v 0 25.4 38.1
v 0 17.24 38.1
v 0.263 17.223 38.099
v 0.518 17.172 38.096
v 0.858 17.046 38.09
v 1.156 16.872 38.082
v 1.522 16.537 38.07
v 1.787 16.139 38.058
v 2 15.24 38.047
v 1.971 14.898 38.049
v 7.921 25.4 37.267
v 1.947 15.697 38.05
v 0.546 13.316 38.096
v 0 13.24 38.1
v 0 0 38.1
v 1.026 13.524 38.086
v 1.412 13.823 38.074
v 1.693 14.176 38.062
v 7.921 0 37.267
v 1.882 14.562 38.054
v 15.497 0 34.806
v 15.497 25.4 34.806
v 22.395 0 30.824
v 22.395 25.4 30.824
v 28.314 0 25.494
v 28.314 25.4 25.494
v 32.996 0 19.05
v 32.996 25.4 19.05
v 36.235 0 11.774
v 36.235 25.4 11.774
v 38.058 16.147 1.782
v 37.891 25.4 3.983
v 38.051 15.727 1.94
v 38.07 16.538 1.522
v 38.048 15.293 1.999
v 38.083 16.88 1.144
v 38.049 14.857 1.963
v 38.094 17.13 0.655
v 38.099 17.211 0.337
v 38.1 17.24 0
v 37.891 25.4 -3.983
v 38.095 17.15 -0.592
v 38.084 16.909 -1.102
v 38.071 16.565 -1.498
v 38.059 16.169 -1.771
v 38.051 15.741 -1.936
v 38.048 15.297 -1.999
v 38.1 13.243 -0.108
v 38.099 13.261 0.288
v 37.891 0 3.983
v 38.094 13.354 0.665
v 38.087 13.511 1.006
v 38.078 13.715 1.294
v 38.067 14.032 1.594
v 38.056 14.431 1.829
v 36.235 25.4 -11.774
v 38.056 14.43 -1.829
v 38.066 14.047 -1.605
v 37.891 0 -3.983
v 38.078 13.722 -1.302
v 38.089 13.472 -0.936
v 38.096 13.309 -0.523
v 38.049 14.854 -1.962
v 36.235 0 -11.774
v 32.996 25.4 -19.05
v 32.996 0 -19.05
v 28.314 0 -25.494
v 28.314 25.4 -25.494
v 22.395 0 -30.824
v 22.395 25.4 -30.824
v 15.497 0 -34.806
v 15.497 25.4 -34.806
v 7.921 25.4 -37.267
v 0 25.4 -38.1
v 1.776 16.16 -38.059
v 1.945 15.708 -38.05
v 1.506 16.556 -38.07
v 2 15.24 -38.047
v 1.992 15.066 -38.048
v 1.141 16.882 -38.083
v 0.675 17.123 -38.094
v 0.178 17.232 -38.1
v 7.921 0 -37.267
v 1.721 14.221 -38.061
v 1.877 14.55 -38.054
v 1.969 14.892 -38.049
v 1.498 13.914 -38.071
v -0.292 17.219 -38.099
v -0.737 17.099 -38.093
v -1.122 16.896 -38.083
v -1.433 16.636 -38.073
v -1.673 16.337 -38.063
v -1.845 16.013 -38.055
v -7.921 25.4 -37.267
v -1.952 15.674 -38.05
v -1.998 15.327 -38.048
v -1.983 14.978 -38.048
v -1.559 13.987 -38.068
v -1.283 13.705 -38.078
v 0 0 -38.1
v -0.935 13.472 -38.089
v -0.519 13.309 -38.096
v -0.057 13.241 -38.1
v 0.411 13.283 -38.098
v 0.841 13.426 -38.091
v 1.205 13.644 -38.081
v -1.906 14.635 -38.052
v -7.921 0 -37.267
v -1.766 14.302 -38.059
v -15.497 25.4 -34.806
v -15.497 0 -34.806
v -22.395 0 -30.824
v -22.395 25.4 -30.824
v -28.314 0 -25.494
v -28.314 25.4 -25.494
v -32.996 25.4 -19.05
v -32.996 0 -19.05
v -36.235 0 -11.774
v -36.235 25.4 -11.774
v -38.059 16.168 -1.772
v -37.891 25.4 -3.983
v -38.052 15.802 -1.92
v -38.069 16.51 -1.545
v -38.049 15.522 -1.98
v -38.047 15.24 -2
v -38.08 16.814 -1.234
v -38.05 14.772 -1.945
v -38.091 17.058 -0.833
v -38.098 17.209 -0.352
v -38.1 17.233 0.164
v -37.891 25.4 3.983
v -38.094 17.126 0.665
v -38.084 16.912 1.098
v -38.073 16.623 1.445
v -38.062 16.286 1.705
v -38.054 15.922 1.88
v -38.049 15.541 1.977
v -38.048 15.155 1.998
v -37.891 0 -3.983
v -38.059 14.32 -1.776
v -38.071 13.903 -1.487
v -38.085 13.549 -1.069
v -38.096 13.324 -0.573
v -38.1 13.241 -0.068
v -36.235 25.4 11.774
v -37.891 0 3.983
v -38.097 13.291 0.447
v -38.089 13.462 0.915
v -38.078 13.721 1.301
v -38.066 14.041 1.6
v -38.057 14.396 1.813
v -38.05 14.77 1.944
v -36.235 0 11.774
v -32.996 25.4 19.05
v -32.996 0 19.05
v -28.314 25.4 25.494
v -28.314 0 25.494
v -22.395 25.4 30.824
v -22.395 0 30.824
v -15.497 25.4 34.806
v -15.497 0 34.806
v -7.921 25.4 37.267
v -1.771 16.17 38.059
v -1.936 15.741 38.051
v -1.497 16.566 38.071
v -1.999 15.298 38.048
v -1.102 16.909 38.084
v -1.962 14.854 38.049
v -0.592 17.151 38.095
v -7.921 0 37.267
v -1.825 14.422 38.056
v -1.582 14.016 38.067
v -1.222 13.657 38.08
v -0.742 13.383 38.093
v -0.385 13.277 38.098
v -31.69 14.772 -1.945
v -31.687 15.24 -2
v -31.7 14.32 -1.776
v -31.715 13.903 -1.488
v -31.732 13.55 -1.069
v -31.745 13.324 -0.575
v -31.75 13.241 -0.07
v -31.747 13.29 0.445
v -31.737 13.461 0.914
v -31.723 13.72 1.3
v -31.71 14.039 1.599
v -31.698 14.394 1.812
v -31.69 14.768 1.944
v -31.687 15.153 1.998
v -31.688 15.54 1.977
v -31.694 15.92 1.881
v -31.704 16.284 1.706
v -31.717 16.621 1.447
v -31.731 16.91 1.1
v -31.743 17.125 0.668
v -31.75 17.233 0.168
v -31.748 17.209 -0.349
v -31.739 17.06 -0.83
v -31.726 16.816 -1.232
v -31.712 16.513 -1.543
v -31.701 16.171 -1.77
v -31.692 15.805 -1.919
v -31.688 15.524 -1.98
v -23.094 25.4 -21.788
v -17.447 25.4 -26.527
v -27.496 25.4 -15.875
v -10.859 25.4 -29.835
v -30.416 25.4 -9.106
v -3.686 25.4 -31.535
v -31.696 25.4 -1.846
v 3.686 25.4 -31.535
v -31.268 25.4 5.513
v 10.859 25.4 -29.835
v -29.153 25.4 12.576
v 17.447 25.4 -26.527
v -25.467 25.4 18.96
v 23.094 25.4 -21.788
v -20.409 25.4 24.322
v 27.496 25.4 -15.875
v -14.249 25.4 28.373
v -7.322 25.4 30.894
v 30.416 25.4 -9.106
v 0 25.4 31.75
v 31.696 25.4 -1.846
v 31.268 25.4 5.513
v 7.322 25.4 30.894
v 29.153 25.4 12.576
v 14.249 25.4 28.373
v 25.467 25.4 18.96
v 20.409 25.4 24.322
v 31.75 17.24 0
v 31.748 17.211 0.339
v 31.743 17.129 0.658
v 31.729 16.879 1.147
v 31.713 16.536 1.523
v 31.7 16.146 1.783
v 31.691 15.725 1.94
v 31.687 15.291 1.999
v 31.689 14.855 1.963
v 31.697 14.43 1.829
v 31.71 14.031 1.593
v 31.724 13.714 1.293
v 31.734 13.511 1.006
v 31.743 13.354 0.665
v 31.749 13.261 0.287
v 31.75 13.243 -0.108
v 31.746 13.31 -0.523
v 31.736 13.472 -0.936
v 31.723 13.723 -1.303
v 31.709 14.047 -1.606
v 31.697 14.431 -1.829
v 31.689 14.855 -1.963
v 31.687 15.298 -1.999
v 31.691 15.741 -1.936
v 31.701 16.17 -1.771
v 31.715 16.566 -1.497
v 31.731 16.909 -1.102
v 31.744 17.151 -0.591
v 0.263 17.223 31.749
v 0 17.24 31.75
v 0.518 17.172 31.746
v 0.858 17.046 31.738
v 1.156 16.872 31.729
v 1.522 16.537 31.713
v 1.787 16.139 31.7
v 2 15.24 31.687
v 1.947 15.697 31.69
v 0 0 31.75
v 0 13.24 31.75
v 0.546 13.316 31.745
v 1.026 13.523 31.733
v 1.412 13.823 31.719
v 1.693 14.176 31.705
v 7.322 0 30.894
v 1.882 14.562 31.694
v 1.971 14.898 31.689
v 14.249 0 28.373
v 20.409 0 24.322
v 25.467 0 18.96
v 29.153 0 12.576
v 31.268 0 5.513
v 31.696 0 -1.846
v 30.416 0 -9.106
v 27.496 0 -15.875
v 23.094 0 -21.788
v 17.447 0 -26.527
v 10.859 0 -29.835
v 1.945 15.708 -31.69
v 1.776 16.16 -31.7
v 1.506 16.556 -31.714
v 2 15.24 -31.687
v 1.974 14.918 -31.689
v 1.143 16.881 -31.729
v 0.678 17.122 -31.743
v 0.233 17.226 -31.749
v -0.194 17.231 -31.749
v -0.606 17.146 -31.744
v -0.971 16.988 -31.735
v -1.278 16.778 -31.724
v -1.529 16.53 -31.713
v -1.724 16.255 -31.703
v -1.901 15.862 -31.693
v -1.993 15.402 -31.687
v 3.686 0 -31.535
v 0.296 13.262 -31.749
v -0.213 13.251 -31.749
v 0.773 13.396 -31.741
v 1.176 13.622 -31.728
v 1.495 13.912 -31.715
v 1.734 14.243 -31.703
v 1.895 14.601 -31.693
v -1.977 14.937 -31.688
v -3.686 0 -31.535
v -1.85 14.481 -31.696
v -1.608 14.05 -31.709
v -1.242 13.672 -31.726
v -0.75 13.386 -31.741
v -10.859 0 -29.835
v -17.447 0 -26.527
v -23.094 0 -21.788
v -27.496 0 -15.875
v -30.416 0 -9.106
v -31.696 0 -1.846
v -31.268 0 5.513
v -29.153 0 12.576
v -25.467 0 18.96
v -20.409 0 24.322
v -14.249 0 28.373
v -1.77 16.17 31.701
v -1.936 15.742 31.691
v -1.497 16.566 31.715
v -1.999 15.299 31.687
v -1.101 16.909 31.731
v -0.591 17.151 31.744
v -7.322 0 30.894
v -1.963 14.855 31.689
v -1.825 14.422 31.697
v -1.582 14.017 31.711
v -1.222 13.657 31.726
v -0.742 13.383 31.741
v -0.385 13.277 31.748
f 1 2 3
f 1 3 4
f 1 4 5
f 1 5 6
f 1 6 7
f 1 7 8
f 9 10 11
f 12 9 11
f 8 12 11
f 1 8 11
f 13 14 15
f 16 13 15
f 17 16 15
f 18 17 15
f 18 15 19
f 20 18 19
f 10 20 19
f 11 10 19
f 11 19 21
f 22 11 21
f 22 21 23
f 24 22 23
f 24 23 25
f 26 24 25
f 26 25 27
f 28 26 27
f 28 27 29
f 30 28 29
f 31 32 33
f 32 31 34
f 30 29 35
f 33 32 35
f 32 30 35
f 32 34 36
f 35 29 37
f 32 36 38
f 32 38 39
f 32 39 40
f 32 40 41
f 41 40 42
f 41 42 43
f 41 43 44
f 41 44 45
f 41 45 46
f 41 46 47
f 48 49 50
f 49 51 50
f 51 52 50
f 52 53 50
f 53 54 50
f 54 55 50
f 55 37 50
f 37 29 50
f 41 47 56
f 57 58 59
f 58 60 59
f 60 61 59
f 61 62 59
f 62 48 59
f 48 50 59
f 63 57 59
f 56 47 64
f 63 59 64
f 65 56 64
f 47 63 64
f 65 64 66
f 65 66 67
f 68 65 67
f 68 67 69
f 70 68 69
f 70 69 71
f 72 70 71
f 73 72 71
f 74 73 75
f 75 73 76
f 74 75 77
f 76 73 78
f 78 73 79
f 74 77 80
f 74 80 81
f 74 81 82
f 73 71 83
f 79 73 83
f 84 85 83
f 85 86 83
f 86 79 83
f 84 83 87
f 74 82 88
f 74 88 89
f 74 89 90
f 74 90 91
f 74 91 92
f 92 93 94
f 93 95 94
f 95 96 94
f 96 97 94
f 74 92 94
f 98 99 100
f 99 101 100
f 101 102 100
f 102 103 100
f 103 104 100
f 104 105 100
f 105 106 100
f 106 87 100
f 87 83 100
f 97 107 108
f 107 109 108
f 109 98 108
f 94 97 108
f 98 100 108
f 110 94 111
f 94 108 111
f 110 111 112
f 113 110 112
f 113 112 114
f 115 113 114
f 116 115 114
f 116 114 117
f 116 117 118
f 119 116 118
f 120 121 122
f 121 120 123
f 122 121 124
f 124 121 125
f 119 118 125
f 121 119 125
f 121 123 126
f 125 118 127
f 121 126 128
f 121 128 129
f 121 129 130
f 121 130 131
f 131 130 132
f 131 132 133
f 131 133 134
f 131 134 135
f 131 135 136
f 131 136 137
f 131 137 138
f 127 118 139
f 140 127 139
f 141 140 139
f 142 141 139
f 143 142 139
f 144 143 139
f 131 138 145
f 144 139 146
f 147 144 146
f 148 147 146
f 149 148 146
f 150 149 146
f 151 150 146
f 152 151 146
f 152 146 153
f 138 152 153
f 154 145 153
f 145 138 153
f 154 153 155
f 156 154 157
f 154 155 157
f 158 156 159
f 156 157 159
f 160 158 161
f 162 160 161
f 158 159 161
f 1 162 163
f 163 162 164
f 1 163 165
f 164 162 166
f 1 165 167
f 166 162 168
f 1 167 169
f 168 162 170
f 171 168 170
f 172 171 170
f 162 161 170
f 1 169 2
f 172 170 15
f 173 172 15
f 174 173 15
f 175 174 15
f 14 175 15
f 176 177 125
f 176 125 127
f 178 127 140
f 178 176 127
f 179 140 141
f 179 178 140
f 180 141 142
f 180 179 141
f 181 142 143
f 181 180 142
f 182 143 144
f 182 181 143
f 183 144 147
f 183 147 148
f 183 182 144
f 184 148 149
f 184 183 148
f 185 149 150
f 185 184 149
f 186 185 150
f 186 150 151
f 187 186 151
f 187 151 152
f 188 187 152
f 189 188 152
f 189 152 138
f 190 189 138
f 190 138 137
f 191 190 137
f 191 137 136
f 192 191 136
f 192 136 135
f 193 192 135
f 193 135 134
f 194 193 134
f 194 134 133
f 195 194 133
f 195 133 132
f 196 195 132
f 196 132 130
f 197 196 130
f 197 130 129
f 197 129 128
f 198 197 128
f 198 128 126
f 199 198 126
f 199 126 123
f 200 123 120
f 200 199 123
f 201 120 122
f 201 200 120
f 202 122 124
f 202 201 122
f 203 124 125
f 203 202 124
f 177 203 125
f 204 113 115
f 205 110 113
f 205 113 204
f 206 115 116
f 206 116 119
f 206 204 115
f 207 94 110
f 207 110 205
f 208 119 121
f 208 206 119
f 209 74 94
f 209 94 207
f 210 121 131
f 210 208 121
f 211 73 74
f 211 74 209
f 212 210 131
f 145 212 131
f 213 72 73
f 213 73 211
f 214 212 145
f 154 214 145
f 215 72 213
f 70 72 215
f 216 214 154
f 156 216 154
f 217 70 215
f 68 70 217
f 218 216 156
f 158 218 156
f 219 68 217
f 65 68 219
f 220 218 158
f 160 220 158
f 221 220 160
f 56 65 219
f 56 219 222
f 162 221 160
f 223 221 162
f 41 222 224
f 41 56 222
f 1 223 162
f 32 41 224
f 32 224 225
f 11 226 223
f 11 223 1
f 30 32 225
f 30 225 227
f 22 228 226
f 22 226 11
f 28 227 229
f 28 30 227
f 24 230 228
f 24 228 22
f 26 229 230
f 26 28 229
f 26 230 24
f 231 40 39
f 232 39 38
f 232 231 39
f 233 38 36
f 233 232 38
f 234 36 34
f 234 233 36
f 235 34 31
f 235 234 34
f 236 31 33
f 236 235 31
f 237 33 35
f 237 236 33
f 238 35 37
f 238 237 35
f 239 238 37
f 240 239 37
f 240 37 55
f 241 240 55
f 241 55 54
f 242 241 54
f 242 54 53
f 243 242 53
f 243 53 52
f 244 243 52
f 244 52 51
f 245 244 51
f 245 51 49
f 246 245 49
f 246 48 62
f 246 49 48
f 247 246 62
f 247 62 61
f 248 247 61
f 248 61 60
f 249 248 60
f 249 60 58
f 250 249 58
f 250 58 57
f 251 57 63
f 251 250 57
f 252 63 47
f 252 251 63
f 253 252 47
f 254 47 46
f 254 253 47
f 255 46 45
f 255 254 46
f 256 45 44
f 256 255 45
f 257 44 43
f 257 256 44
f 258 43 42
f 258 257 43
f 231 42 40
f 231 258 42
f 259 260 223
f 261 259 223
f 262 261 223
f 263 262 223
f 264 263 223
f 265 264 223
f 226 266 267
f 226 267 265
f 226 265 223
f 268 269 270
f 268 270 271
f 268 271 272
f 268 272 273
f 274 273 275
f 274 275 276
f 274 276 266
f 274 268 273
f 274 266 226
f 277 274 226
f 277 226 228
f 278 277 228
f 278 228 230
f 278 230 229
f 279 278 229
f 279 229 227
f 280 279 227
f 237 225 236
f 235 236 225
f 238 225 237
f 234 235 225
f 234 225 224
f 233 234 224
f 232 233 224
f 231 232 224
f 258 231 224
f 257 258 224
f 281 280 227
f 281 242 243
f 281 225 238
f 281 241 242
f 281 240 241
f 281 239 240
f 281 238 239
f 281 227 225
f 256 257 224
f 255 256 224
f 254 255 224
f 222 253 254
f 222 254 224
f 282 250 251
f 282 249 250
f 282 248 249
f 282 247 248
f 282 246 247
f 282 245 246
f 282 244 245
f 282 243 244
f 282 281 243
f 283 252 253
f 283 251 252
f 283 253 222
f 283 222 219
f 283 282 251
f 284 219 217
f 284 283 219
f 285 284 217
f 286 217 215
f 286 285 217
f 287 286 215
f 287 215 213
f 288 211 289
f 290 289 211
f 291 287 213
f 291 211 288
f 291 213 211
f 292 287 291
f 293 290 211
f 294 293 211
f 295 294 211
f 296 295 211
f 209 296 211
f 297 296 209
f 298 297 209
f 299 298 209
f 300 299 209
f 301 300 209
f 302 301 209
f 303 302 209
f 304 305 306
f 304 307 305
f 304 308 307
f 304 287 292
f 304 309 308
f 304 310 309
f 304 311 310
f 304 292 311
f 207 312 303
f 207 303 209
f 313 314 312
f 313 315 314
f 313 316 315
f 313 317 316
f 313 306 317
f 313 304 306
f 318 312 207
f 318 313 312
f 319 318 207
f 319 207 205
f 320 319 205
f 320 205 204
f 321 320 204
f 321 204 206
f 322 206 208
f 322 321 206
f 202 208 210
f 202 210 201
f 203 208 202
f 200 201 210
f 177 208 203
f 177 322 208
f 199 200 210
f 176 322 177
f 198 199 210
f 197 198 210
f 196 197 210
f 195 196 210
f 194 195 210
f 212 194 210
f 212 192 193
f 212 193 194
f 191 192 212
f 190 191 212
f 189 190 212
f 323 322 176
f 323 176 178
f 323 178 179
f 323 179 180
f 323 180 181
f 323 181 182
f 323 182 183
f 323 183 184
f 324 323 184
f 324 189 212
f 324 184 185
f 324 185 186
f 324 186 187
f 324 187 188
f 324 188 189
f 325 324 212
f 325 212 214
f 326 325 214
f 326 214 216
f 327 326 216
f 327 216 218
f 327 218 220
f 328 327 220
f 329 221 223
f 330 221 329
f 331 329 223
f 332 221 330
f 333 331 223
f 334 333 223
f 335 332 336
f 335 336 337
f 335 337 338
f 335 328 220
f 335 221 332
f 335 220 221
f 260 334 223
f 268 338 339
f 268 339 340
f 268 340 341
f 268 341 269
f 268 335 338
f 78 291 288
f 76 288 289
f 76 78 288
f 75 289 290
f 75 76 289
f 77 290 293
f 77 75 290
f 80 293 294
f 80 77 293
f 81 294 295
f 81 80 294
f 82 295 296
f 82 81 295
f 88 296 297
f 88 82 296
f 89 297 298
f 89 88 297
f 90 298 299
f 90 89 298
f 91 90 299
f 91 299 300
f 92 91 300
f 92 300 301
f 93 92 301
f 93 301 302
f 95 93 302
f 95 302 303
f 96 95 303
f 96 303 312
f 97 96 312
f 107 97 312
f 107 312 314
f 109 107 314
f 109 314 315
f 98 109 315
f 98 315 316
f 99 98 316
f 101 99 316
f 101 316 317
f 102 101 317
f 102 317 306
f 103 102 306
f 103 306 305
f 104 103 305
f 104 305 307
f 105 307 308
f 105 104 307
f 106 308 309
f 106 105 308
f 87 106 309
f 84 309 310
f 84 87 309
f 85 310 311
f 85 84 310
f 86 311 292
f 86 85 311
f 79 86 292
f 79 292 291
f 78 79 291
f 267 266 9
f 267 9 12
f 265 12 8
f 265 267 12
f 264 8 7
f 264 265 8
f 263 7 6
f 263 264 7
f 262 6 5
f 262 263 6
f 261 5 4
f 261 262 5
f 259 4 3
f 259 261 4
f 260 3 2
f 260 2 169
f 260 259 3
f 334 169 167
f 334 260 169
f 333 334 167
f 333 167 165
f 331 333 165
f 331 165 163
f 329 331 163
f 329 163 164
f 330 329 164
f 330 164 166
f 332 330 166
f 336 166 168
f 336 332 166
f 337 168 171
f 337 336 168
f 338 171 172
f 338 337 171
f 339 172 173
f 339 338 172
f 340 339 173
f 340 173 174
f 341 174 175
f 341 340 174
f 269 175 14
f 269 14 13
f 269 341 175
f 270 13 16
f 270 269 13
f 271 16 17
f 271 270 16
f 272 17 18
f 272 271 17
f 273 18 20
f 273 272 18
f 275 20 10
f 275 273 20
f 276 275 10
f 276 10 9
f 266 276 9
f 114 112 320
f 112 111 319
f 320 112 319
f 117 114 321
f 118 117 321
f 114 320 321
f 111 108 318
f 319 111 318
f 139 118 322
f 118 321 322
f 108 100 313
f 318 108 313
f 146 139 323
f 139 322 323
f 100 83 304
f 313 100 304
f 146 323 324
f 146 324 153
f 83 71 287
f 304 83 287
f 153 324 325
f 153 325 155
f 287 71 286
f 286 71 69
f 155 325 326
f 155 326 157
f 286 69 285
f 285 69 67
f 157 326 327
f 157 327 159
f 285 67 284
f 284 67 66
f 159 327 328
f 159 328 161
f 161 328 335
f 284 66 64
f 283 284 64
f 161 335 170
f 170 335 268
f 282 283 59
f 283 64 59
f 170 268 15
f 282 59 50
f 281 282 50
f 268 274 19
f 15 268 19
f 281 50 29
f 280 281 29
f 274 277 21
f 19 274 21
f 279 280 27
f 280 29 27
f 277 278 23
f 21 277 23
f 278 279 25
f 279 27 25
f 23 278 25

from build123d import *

# Parameters (mm, degrees)
SKETCH1_R               = 38.1
SKETCH1_R_2             = 31.75
BOSS_EXTRUDE1_DEPTH     = 25.4
CUT_EXTRUDE1_START      = -10
SKETCH2_R               = 2
CUT_EXTRUDE1_DEPTH      = 99.9
CIRPATTERN1_START       = 31.686945161
CIRPATTERN1_OUTLINE_R   = 2
CIRPATTERN1_DEPTH       = 6.413054905
CIRPATTERN1_START_2     = -38.100000066
CIRPATTERN1_2_OUTLINE_R = 2
CIRPATTERN1_2_DEPTH     = 76.200000132


# Read off the part's stored shape, not the designer's step: CirPattern1
with BuildPart() as part:
    # Sketch1 → Boss-Extrude1 (new body)
    with BuildSketch(Plane(origin=(0, 0, 0), x_dir=(1, 0, 0), z_dir=(0, 1, 0))):
        with Locations(Location((0, 0, 0), (0, 0, 270))):
            Circle(SKETCH1_R)
        with Locations(Location((0, 0, 0), (0, 0, 270))):
            Circle(SKETCH1_R_2, mode=Mode.SUBTRACT)
    extrude(amount=BOSS_EXTRUDE1_DEPTH)

    # Sketch2 → Cut-Extrude1 (cut)
    with BuildSketch(Plane.ZY.offset(38.1).offset(CUT_EXTRUDE1_START)):
        with Locations(Location((0, 15.24, 0), (0, 0, 180))):
            Circle(SKETCH2_R)
    extrude(amount=CUT_EXTRUDE1_DEPTH, mode=Mode.SUBTRACT)

    # CirPattern1 outline → CirPattern1 (cut)
    with BuildSketch(Plane.YZ.offset(CIRPATTERN1_START)):
        with Locations((15.24, 0)):
            Circle(CIRPATTERN1_OUTLINE_R)
    extrude(amount=CIRPATTERN1_DEPTH, mode=Mode.SUBTRACT)

    # CirPattern1 2 outline → CirPattern1 2 (cut)
    with BuildSketch(Plane.XY.offset(CIRPATTERN1_START_2)):
        with Locations((0, 15.24)):
            Circle(CIRPATTERN1_2_OUTLINE_R)
    extrude(amount=CIRPATTERN1_2_DEPTH, mode=Mode.SUBTRACT)


solid = part.part
